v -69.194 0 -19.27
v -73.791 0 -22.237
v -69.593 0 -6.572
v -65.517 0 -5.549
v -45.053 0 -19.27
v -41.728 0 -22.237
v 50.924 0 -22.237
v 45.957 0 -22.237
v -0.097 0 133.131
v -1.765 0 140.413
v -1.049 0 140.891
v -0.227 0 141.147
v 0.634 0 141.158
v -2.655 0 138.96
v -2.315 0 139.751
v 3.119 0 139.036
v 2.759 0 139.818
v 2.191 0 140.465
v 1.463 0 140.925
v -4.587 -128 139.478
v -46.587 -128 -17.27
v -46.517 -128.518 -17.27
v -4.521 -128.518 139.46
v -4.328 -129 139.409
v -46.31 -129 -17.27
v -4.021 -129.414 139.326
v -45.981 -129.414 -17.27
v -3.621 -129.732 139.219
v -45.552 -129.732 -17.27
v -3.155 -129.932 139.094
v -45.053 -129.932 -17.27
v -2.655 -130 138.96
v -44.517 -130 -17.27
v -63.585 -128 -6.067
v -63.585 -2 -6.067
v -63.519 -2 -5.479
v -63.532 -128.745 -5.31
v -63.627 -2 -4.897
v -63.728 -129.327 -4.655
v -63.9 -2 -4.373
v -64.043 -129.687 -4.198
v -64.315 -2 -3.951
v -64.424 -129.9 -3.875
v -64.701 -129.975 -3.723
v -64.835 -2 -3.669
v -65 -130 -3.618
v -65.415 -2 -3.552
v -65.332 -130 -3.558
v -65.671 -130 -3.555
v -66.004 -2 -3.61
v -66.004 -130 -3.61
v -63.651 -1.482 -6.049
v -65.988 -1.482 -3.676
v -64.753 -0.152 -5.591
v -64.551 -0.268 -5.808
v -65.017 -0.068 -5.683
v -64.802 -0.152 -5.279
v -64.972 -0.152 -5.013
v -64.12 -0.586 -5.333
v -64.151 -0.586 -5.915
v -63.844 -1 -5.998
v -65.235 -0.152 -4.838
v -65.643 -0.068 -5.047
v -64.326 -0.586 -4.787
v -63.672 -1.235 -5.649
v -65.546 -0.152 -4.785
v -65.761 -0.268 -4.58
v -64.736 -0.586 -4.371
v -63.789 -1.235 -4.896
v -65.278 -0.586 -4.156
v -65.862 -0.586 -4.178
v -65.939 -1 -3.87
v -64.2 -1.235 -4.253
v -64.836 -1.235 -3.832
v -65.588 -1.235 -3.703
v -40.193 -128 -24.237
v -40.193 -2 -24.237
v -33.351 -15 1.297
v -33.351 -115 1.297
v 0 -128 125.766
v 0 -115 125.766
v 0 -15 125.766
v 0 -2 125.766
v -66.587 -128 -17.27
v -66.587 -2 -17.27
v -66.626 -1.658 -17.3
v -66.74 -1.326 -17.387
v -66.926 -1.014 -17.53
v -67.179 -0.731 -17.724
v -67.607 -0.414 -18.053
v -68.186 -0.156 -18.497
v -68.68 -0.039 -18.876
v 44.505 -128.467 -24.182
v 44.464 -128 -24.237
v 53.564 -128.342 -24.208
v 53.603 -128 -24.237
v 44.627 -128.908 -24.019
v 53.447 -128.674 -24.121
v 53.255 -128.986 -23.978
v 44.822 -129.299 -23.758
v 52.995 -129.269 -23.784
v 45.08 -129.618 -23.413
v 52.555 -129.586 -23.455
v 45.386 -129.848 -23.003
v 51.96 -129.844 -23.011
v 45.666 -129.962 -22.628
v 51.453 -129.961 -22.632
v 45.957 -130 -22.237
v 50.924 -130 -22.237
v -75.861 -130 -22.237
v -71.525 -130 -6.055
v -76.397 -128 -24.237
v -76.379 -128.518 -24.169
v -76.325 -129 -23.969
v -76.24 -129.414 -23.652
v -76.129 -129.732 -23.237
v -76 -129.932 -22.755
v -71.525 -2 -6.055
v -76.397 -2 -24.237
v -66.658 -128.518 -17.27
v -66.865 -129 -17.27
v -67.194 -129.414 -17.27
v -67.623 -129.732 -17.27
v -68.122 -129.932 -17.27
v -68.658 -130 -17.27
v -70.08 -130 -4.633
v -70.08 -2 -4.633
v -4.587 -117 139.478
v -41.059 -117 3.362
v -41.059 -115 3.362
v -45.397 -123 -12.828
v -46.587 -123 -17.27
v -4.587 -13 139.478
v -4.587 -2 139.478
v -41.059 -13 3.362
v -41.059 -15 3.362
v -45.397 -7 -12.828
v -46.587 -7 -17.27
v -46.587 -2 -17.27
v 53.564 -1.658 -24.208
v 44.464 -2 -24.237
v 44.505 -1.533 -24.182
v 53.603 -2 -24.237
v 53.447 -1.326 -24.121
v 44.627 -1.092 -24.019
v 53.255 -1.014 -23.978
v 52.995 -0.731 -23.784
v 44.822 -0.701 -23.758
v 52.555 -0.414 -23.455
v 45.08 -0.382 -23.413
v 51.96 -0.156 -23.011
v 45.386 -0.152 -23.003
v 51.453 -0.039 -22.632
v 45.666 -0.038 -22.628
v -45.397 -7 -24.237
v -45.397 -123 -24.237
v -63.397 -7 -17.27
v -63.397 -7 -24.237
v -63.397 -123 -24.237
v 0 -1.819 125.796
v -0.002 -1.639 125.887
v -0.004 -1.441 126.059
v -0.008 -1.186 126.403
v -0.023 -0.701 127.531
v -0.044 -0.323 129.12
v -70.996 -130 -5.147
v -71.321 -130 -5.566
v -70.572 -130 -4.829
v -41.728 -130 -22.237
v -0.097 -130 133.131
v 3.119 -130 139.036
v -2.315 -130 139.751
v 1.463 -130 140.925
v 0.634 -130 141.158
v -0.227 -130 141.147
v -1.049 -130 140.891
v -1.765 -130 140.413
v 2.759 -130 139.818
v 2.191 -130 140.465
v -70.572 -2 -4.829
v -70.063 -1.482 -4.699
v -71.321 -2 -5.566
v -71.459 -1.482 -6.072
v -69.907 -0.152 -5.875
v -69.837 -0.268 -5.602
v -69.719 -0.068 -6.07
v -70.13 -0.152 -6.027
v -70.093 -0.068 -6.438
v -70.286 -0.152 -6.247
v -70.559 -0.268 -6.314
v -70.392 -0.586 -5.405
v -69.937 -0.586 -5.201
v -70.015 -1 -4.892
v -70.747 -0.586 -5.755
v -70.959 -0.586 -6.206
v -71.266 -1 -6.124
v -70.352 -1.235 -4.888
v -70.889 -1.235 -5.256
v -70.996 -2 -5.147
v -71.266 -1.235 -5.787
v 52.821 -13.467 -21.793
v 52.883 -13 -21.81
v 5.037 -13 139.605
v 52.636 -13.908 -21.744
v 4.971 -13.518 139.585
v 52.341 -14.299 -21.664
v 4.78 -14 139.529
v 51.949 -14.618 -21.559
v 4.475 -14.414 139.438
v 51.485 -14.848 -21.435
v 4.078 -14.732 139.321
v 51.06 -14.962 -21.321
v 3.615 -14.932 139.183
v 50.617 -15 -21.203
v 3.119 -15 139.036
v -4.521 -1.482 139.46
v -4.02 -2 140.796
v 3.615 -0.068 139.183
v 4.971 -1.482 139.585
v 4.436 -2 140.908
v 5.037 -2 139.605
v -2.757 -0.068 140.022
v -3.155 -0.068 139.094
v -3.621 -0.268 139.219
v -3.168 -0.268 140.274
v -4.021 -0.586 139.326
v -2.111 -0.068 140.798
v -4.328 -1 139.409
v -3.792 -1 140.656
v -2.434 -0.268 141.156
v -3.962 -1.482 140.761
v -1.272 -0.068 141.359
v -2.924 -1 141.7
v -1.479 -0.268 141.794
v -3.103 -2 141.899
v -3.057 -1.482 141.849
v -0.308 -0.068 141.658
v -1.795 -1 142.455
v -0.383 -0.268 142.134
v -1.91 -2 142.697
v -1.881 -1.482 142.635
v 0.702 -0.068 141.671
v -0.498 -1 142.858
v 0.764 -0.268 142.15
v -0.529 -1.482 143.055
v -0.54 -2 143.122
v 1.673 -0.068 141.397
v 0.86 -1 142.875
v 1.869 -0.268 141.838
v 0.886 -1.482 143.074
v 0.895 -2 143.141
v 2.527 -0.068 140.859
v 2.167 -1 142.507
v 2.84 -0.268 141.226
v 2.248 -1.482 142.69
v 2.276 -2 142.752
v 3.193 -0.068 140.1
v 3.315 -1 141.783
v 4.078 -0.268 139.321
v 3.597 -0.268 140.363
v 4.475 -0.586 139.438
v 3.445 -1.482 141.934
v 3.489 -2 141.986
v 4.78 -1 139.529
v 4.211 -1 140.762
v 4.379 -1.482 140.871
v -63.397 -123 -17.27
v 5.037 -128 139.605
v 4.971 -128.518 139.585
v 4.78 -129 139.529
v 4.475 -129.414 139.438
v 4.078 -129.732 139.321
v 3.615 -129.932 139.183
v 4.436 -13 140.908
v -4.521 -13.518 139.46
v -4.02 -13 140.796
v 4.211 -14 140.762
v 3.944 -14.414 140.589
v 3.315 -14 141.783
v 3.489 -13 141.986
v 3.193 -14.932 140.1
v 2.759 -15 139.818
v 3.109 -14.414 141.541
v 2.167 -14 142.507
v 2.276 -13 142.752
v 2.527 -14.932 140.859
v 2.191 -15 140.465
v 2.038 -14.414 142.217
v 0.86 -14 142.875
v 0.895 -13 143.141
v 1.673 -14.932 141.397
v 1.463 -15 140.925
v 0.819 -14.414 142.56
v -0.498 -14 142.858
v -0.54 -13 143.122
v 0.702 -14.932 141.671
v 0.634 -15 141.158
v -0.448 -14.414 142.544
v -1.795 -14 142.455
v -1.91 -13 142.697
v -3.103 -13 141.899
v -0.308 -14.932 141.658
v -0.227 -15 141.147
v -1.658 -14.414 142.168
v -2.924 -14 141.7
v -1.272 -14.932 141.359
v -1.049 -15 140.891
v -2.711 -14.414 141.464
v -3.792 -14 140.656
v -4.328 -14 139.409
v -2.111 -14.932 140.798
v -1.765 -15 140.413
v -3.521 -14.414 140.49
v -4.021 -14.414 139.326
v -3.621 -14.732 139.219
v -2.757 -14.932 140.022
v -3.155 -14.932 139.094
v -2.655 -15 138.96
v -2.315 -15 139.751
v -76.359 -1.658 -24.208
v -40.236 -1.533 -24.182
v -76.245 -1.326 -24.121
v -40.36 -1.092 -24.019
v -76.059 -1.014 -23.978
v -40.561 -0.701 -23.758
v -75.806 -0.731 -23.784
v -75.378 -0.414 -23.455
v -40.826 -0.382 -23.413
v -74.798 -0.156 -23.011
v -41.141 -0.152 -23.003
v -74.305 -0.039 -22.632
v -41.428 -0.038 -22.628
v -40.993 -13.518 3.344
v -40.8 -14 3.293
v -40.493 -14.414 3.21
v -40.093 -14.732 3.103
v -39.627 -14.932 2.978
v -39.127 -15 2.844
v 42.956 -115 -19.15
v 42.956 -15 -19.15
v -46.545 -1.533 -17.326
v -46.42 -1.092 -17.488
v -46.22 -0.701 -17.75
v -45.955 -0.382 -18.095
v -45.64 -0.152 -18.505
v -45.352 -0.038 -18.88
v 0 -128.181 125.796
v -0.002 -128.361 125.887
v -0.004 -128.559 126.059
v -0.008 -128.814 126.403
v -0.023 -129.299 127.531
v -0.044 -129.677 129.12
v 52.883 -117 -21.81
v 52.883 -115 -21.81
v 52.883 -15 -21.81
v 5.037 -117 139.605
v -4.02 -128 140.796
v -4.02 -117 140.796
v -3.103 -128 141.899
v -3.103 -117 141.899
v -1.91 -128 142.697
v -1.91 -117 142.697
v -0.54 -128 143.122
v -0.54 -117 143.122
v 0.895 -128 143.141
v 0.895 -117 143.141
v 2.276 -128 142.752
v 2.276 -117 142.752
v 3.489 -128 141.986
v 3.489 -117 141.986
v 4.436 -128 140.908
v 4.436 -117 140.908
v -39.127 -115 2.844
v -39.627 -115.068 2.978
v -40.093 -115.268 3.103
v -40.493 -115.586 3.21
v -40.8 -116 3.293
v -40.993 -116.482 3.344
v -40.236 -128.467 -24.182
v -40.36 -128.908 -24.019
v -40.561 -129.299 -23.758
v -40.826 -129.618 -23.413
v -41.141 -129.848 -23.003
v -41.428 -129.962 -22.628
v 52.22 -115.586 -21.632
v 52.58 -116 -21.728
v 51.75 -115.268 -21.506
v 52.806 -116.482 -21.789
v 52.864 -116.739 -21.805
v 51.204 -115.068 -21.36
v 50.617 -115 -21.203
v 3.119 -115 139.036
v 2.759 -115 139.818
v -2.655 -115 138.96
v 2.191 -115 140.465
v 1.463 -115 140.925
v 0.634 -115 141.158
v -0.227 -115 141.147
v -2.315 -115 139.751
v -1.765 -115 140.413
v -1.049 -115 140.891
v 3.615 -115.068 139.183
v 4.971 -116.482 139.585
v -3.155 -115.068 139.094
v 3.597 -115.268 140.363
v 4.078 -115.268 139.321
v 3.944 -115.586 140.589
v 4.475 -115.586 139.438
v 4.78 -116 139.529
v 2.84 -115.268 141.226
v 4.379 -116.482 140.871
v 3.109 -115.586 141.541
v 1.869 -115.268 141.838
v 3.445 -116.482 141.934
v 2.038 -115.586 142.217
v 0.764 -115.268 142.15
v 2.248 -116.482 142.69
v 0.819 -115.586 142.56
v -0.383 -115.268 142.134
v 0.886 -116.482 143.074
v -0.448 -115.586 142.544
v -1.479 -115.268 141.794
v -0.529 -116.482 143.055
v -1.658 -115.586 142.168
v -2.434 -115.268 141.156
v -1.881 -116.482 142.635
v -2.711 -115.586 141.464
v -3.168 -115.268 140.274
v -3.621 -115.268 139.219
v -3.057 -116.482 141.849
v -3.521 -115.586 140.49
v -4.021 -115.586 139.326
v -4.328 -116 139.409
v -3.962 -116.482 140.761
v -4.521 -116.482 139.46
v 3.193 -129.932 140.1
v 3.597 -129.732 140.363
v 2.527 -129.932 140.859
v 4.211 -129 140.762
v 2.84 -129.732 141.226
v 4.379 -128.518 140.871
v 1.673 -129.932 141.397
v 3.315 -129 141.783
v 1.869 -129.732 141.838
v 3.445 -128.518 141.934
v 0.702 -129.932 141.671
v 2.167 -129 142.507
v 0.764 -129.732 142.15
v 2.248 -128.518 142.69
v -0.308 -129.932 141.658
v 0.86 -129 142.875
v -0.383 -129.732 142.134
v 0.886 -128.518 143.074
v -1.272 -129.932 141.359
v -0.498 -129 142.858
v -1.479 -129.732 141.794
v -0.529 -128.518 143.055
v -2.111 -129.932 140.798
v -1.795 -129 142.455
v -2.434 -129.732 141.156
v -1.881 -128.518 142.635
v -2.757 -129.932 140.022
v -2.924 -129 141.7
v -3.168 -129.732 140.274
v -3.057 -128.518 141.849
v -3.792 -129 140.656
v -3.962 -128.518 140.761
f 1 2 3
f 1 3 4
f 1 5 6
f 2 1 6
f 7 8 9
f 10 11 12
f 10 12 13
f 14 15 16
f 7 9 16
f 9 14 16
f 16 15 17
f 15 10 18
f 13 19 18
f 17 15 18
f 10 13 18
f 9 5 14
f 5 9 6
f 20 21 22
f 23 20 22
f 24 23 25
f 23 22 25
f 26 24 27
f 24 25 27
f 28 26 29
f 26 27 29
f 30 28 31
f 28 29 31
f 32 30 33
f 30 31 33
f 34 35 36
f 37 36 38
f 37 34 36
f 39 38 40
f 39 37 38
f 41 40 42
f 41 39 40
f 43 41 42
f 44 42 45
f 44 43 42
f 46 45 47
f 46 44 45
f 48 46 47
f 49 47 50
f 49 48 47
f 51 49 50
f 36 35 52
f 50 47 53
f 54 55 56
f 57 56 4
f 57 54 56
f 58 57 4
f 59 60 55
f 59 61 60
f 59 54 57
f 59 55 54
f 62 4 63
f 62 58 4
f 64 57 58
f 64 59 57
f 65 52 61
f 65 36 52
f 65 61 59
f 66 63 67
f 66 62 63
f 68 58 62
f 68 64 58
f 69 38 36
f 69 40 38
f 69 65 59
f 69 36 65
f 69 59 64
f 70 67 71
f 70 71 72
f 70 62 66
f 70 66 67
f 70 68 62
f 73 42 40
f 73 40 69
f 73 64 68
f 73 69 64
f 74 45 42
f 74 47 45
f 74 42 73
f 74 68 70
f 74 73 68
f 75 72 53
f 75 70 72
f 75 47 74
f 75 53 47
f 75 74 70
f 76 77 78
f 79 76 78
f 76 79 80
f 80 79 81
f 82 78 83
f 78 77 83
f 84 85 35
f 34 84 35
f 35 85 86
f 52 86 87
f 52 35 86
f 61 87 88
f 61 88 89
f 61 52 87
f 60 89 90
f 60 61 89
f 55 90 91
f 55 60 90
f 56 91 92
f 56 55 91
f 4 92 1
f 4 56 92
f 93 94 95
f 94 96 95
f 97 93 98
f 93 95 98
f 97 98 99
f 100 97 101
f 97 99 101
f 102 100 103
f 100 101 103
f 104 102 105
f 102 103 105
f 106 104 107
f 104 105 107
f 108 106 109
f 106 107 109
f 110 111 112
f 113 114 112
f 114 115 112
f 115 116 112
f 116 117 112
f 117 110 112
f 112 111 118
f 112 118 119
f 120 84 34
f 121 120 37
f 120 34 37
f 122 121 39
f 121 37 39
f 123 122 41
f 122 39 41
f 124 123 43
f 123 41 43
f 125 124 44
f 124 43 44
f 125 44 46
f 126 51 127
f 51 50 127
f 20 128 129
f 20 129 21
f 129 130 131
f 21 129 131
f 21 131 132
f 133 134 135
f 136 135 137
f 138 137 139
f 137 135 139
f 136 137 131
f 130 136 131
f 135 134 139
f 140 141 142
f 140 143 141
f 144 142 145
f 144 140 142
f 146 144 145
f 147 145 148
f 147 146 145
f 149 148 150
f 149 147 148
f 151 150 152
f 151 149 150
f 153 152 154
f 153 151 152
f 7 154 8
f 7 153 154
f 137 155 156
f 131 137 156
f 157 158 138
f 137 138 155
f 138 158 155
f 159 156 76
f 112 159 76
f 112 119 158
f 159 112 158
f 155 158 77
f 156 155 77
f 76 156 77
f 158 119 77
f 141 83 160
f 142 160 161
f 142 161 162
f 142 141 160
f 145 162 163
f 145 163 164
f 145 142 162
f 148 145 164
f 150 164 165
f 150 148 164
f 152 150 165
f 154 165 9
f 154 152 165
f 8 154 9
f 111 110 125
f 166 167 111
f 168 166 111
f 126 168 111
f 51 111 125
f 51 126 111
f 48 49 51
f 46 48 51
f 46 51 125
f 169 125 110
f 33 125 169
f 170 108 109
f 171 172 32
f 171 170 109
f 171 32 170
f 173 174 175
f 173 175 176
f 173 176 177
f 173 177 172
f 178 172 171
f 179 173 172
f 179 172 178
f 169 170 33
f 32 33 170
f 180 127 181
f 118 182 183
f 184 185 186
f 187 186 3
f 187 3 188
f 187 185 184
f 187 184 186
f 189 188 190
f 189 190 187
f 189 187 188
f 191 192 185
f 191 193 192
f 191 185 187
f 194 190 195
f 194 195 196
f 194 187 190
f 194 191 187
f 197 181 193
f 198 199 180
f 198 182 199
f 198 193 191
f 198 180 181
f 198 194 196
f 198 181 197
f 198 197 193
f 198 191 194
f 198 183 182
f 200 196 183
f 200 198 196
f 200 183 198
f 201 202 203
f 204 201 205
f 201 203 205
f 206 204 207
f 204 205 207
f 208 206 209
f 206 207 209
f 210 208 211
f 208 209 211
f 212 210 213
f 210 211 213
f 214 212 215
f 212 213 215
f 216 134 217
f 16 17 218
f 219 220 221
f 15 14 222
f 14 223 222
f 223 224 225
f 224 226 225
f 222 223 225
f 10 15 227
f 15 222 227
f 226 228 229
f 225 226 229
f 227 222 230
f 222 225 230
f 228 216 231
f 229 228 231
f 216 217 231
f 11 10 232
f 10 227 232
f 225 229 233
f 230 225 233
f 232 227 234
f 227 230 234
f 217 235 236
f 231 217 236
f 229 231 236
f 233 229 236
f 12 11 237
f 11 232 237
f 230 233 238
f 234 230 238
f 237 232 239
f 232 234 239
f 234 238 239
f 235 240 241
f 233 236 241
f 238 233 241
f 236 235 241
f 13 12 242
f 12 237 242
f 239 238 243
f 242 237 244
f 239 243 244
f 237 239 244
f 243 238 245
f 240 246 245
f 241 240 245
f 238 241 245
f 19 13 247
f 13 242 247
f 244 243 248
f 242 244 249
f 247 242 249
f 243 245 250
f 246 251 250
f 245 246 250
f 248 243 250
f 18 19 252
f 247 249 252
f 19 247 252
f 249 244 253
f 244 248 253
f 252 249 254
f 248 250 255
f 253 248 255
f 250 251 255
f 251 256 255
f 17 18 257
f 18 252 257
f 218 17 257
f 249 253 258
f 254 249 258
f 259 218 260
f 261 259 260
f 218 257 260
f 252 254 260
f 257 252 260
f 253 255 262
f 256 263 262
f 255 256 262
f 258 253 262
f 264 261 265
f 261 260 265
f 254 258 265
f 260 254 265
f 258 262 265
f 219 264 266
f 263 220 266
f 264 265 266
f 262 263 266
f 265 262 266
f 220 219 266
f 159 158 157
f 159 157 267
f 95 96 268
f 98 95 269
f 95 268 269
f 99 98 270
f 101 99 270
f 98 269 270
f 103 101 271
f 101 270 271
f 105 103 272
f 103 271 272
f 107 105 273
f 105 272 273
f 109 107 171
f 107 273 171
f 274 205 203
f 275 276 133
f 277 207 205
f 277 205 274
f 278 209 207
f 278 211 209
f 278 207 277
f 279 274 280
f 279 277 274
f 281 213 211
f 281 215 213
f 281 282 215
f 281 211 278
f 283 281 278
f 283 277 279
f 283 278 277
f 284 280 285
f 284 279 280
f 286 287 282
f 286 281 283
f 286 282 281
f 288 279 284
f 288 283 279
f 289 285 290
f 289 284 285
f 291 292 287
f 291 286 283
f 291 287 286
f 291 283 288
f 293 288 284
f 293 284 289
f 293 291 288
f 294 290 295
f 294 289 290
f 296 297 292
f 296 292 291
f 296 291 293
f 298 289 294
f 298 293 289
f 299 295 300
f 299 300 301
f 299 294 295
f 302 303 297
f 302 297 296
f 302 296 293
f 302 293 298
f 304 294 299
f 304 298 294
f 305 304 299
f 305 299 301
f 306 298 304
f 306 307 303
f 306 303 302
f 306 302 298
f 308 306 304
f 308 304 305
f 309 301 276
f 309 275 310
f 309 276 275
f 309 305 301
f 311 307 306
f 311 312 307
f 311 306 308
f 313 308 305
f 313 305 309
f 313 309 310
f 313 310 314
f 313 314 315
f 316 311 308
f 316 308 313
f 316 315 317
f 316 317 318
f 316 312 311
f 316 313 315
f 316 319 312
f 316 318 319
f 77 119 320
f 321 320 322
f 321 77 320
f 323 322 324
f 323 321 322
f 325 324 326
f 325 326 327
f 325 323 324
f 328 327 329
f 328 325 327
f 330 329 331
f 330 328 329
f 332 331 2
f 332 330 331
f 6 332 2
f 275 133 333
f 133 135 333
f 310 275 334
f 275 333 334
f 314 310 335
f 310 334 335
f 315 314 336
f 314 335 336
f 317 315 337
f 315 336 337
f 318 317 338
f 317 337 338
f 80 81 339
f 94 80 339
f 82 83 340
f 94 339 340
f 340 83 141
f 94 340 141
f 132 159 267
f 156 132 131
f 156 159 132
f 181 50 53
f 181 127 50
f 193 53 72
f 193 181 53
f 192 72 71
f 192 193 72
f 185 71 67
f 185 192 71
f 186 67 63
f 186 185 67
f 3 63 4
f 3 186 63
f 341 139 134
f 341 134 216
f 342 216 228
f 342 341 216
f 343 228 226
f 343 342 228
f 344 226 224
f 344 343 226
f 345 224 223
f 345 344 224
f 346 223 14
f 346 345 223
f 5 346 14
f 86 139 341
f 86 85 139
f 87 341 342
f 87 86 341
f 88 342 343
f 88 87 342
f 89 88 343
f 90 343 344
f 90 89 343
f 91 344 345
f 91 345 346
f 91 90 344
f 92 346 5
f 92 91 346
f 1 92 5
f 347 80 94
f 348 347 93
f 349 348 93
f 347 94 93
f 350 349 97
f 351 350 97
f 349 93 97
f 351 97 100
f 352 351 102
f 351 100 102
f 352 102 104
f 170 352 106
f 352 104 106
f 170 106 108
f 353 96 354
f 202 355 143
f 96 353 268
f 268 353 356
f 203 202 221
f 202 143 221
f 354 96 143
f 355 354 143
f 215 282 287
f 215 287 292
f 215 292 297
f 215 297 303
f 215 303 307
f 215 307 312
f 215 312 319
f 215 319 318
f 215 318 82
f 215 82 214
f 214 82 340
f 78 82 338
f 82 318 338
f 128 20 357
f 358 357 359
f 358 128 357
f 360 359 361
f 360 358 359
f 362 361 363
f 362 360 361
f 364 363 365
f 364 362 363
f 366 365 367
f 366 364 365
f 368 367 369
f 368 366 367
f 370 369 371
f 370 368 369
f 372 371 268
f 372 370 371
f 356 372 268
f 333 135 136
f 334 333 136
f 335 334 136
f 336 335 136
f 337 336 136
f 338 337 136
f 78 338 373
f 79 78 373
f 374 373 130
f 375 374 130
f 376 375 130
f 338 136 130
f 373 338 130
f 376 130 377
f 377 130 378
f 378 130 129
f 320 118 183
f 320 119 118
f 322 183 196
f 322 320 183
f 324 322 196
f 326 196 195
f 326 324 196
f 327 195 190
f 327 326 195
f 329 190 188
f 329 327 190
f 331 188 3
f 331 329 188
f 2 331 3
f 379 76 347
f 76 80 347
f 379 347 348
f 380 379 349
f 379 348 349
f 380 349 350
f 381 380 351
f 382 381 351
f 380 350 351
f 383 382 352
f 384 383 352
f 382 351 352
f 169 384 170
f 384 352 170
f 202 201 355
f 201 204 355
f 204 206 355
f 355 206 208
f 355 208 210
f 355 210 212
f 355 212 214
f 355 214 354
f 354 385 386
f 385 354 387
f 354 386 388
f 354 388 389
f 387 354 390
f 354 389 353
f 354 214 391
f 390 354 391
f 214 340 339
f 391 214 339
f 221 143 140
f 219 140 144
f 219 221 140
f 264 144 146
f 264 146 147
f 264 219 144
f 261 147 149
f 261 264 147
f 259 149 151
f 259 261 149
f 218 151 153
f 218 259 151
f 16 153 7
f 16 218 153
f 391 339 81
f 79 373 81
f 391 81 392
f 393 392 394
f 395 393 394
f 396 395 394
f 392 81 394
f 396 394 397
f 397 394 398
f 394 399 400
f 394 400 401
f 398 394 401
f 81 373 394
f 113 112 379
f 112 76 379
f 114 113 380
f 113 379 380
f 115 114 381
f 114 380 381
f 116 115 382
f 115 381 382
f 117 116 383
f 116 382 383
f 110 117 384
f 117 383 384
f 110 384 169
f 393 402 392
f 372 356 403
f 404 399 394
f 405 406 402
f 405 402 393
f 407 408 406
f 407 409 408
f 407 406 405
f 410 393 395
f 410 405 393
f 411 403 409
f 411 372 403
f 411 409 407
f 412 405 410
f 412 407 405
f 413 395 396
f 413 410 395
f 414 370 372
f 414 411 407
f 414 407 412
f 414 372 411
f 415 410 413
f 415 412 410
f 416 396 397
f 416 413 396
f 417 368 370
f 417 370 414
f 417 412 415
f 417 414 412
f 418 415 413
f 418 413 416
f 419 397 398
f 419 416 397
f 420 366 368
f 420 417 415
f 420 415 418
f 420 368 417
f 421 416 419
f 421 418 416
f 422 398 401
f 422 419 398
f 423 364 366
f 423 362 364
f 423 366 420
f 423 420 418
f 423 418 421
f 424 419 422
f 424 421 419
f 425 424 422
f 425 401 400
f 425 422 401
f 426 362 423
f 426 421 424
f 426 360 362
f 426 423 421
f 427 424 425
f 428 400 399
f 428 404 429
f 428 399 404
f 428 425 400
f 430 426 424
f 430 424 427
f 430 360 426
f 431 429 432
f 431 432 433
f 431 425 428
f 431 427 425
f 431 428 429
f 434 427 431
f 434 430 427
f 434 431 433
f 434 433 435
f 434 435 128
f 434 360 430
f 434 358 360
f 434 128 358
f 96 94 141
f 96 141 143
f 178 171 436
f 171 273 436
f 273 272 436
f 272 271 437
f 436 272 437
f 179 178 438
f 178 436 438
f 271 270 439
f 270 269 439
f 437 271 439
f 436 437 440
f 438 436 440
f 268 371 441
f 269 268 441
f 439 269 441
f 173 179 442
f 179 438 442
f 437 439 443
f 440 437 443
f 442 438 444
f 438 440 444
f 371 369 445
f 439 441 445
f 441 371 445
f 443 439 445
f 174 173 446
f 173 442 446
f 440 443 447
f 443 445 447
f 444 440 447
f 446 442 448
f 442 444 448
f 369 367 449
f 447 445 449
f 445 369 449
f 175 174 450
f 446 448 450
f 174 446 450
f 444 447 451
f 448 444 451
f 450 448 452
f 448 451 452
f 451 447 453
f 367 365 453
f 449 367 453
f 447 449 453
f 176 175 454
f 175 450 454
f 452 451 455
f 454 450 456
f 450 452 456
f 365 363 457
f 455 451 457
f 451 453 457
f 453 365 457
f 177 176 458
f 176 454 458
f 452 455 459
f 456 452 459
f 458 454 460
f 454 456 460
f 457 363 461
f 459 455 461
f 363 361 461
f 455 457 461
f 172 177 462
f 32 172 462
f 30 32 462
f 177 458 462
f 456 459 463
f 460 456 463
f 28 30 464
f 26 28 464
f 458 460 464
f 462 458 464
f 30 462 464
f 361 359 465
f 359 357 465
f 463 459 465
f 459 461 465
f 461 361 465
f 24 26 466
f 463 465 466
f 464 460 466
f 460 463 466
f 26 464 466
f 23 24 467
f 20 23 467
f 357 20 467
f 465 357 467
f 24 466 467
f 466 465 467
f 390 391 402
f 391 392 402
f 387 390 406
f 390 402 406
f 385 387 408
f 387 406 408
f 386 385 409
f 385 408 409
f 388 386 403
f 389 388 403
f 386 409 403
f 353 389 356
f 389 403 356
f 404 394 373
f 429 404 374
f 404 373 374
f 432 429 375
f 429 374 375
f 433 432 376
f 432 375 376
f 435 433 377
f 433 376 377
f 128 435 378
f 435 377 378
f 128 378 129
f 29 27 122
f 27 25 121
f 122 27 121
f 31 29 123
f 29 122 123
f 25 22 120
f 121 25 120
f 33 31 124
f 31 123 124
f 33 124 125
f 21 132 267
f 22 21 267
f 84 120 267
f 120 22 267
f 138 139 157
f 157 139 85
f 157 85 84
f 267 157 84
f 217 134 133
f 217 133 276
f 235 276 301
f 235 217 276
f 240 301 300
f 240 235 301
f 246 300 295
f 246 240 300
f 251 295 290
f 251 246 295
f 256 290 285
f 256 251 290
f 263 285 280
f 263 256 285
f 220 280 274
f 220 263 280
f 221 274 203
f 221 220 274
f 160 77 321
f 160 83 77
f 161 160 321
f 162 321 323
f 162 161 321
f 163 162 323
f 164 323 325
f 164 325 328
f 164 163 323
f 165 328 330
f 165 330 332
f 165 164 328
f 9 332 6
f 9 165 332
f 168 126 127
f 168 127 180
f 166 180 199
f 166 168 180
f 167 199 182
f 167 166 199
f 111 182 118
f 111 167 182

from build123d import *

# Parameters (mm, degrees)
F1_DEPTH    = 130
F2_R        = 2
F3_T1_DEPTH = 130
F3_T4_ANGLE = 148.4890190499
F3_T6_ANGLE = 148.4890190499
F4_W        = 18
F4_H        = 116
F5_DEPTH    = 15
F6_W        = 100
F6_H        = 140.9174852884
F6_H_2      = 11.4719050156
F1_FACE2_W  = 126
F1_FACE2_H  = 170.8886996293
F7_DEPTH    = 300
F8_R        = 2


# Not quite as in the source:
# - a fillet or chamfer that OpenCascade refuses, or shapes differently, is made with other operations: its cross-section is extruded or revolved along the edge and cut away or added


with BuildPart() as f1:
    # F0 (on Front) → F1 (new body)
    with BuildSketch(Plane.XZ):
        Polygon((-46.5874281185, -17.2704798563), (-66.5874281185, -17.2704798563), (-62.7051424419, -2.781592462), (-71.2205818073, -4.9188610433), (-76.3969627094, -24.2373775691), (-40.1931625425, -24.2373775691), (0, 125.7655471563), (44.4641634577, -24.2373775691), (53.6030372906, -24.2373775691), (0, 156.5961688757), align=None)
    extrude(amount=F1_DEPTH)

    # F2
    f2_edges = [f1.edges().sort_by_distance(p)[0] for p in [
        (-23.293714, -130, 69.662845),
        (-20.096581, -130, 50.764085),
        (-64.646285, -130, -10.026036),
        (-62.705142, -65, -2.781592),
        (-71.220582, -65, -4.918861),
        (22.232082, -130, 50.764085),
        (26.801519, -130, 66.179396),
        (-23.293714, 0, 69.662845),
        (-20.096581, 0, 50.764085),
        (-56.587428, 0, -17.27048),
        (-64.646285, 0, -10.026036),
        (-66.962862, 0, -3.850227),
        (-73.808772, 0, -14.578119),
        (-58.295063, 0, -24.237378),
        (22.232082, 0, 50.764085),
        (49.0336, 0, -24.237378),
        (26.801519, 0, 66.179396),
        (-58.295063, -130, -24.237378),
        (49.0336, -130, -24.237378),
    ]]
    fillet(f2_edges, radius=F2_R)

    # F3: fillet of radius 5 on 1 edges, made by hand

    # F3_s2 → F3_t1 (cut)
    with BuildSketch(Plane.XZ):
        with BuildLine():
            ThreePointArc((-4.5868330474, 139.4778748971), (0.1768690132, 143.1833450148), (5.0366225074, 139.6047751759))
            Line((5.0366225074, 139.6047751759), (0, 156.5961688757))
            Line((0, 156.5961688757), (-4.5868330474, 139.4778748971))
        make_face()
    extrude(amount=F3_T1_DEPTH, mode=Mode.SUBTRACT)

    # F3_s3 → F3_t4 (revolve, cut)
    with BuildSketch(Plane(origin=(34.5622091716, 0, 128.9879206501), x_dir=(0, 1, 0), z_dir=(-0.2588190451, 0, -0.9659258263))):
        with BuildLine():
            ThreePointArc((0, -38.5300708951), (-0.5857864376, -39.9442844575), (-2, -40.5300708951))
            Line((-2, -40.5300708951), (0, -40.5300708951))
            Line((0, -40.5300708951), (0, -38.5300708951))
        make_face()
    revolve(axis=Axis((0.2427960841, 0, 138.1837796716), (0, 1, 0)), revolution_arc=F3_T4_ANGLE, mode=Mode.SUBTRACT)

    # F3_s5 → F3_t6 (revolve, cut)
    with BuildSketch(Plane(origin=(-37.6327378938, 0, 126.9566390213), x_dir=(0, 1, 0), z_dir=(0.2841991009, 0, -0.9587652847))):
        with BuildLine():
            ThreePointArc((-130, 42.5044903939), (-129.4142135624, 43.9187039563), (-128, 44.5044903939))
            Line((-128, 44.5044903939), (-130, 44.5044903939))
            Line((-130, 44.5044903939), (-130, 42.5044903939))
        make_face()
    revolve(axis=Axis((0.2427960841, -130, 138.1837796716), (0, -1, 0)), revolution_arc=F3_T6_ANGLE, mode=Mode.SUBTRACT)

    # F4 (on face) → F5 (cut)
    with BuildSketch(Plane(origin=(0, 0, -24.2373775691), x_dir=(1, 0, 0), z_dir=(0, 0, -1))):
        with Locations((-54.3969627094, 65)):
            Rectangle(F4_W, F4_H)
    extrude(amount=-F5_DEPTH, mode=Mode.SUBTRACT)

    # F6 (on face) + F1_face2 (on face) → F7 (cut)
    with BuildSketch(Plane(origin=(-39.1490422189, 0, 10.489954247), x_dir=(0, -1, 0), z_dir=(-0.9659258263, 0, 0.2588190451))):
        with Locations((65, 63.0793791654)):
            Rectangle(F6_W, F6_H)
        with Locations((65, 139.2740743175)):
            Rectangle(F6_W, F6_H_2)
    with BuildSketch(Plane(origin=(29.319829899, -65, 57.6836988034), x_dir=(0, 1, 0), z_dir=(0.9587652847, 0, 0.2841991009))):
        Rectangle(F1_FACE2_W, F1_FACE2_H)
    extrude(amount=-F7_DEPTH, dir=(-0.9659258263, 0, 0.2588190451), mode=Mode.SUBTRACT)

    # F8
    f8_edges = [f1.edges().sort_by_distance(p)[0] for p in [
        (-22.822898, -15, 71.419956),
        (28.960029, -115, 58.897511),
        (-22.822898, -115, 71.419956),
        (0.176869, -115, 143.183345),
        (28.960029, -15, 58.897511),
        (0.176869, -15, 143.183345),
    ]]
    fillet(f8_edges, radius=F8_R)


solid = f1.part
